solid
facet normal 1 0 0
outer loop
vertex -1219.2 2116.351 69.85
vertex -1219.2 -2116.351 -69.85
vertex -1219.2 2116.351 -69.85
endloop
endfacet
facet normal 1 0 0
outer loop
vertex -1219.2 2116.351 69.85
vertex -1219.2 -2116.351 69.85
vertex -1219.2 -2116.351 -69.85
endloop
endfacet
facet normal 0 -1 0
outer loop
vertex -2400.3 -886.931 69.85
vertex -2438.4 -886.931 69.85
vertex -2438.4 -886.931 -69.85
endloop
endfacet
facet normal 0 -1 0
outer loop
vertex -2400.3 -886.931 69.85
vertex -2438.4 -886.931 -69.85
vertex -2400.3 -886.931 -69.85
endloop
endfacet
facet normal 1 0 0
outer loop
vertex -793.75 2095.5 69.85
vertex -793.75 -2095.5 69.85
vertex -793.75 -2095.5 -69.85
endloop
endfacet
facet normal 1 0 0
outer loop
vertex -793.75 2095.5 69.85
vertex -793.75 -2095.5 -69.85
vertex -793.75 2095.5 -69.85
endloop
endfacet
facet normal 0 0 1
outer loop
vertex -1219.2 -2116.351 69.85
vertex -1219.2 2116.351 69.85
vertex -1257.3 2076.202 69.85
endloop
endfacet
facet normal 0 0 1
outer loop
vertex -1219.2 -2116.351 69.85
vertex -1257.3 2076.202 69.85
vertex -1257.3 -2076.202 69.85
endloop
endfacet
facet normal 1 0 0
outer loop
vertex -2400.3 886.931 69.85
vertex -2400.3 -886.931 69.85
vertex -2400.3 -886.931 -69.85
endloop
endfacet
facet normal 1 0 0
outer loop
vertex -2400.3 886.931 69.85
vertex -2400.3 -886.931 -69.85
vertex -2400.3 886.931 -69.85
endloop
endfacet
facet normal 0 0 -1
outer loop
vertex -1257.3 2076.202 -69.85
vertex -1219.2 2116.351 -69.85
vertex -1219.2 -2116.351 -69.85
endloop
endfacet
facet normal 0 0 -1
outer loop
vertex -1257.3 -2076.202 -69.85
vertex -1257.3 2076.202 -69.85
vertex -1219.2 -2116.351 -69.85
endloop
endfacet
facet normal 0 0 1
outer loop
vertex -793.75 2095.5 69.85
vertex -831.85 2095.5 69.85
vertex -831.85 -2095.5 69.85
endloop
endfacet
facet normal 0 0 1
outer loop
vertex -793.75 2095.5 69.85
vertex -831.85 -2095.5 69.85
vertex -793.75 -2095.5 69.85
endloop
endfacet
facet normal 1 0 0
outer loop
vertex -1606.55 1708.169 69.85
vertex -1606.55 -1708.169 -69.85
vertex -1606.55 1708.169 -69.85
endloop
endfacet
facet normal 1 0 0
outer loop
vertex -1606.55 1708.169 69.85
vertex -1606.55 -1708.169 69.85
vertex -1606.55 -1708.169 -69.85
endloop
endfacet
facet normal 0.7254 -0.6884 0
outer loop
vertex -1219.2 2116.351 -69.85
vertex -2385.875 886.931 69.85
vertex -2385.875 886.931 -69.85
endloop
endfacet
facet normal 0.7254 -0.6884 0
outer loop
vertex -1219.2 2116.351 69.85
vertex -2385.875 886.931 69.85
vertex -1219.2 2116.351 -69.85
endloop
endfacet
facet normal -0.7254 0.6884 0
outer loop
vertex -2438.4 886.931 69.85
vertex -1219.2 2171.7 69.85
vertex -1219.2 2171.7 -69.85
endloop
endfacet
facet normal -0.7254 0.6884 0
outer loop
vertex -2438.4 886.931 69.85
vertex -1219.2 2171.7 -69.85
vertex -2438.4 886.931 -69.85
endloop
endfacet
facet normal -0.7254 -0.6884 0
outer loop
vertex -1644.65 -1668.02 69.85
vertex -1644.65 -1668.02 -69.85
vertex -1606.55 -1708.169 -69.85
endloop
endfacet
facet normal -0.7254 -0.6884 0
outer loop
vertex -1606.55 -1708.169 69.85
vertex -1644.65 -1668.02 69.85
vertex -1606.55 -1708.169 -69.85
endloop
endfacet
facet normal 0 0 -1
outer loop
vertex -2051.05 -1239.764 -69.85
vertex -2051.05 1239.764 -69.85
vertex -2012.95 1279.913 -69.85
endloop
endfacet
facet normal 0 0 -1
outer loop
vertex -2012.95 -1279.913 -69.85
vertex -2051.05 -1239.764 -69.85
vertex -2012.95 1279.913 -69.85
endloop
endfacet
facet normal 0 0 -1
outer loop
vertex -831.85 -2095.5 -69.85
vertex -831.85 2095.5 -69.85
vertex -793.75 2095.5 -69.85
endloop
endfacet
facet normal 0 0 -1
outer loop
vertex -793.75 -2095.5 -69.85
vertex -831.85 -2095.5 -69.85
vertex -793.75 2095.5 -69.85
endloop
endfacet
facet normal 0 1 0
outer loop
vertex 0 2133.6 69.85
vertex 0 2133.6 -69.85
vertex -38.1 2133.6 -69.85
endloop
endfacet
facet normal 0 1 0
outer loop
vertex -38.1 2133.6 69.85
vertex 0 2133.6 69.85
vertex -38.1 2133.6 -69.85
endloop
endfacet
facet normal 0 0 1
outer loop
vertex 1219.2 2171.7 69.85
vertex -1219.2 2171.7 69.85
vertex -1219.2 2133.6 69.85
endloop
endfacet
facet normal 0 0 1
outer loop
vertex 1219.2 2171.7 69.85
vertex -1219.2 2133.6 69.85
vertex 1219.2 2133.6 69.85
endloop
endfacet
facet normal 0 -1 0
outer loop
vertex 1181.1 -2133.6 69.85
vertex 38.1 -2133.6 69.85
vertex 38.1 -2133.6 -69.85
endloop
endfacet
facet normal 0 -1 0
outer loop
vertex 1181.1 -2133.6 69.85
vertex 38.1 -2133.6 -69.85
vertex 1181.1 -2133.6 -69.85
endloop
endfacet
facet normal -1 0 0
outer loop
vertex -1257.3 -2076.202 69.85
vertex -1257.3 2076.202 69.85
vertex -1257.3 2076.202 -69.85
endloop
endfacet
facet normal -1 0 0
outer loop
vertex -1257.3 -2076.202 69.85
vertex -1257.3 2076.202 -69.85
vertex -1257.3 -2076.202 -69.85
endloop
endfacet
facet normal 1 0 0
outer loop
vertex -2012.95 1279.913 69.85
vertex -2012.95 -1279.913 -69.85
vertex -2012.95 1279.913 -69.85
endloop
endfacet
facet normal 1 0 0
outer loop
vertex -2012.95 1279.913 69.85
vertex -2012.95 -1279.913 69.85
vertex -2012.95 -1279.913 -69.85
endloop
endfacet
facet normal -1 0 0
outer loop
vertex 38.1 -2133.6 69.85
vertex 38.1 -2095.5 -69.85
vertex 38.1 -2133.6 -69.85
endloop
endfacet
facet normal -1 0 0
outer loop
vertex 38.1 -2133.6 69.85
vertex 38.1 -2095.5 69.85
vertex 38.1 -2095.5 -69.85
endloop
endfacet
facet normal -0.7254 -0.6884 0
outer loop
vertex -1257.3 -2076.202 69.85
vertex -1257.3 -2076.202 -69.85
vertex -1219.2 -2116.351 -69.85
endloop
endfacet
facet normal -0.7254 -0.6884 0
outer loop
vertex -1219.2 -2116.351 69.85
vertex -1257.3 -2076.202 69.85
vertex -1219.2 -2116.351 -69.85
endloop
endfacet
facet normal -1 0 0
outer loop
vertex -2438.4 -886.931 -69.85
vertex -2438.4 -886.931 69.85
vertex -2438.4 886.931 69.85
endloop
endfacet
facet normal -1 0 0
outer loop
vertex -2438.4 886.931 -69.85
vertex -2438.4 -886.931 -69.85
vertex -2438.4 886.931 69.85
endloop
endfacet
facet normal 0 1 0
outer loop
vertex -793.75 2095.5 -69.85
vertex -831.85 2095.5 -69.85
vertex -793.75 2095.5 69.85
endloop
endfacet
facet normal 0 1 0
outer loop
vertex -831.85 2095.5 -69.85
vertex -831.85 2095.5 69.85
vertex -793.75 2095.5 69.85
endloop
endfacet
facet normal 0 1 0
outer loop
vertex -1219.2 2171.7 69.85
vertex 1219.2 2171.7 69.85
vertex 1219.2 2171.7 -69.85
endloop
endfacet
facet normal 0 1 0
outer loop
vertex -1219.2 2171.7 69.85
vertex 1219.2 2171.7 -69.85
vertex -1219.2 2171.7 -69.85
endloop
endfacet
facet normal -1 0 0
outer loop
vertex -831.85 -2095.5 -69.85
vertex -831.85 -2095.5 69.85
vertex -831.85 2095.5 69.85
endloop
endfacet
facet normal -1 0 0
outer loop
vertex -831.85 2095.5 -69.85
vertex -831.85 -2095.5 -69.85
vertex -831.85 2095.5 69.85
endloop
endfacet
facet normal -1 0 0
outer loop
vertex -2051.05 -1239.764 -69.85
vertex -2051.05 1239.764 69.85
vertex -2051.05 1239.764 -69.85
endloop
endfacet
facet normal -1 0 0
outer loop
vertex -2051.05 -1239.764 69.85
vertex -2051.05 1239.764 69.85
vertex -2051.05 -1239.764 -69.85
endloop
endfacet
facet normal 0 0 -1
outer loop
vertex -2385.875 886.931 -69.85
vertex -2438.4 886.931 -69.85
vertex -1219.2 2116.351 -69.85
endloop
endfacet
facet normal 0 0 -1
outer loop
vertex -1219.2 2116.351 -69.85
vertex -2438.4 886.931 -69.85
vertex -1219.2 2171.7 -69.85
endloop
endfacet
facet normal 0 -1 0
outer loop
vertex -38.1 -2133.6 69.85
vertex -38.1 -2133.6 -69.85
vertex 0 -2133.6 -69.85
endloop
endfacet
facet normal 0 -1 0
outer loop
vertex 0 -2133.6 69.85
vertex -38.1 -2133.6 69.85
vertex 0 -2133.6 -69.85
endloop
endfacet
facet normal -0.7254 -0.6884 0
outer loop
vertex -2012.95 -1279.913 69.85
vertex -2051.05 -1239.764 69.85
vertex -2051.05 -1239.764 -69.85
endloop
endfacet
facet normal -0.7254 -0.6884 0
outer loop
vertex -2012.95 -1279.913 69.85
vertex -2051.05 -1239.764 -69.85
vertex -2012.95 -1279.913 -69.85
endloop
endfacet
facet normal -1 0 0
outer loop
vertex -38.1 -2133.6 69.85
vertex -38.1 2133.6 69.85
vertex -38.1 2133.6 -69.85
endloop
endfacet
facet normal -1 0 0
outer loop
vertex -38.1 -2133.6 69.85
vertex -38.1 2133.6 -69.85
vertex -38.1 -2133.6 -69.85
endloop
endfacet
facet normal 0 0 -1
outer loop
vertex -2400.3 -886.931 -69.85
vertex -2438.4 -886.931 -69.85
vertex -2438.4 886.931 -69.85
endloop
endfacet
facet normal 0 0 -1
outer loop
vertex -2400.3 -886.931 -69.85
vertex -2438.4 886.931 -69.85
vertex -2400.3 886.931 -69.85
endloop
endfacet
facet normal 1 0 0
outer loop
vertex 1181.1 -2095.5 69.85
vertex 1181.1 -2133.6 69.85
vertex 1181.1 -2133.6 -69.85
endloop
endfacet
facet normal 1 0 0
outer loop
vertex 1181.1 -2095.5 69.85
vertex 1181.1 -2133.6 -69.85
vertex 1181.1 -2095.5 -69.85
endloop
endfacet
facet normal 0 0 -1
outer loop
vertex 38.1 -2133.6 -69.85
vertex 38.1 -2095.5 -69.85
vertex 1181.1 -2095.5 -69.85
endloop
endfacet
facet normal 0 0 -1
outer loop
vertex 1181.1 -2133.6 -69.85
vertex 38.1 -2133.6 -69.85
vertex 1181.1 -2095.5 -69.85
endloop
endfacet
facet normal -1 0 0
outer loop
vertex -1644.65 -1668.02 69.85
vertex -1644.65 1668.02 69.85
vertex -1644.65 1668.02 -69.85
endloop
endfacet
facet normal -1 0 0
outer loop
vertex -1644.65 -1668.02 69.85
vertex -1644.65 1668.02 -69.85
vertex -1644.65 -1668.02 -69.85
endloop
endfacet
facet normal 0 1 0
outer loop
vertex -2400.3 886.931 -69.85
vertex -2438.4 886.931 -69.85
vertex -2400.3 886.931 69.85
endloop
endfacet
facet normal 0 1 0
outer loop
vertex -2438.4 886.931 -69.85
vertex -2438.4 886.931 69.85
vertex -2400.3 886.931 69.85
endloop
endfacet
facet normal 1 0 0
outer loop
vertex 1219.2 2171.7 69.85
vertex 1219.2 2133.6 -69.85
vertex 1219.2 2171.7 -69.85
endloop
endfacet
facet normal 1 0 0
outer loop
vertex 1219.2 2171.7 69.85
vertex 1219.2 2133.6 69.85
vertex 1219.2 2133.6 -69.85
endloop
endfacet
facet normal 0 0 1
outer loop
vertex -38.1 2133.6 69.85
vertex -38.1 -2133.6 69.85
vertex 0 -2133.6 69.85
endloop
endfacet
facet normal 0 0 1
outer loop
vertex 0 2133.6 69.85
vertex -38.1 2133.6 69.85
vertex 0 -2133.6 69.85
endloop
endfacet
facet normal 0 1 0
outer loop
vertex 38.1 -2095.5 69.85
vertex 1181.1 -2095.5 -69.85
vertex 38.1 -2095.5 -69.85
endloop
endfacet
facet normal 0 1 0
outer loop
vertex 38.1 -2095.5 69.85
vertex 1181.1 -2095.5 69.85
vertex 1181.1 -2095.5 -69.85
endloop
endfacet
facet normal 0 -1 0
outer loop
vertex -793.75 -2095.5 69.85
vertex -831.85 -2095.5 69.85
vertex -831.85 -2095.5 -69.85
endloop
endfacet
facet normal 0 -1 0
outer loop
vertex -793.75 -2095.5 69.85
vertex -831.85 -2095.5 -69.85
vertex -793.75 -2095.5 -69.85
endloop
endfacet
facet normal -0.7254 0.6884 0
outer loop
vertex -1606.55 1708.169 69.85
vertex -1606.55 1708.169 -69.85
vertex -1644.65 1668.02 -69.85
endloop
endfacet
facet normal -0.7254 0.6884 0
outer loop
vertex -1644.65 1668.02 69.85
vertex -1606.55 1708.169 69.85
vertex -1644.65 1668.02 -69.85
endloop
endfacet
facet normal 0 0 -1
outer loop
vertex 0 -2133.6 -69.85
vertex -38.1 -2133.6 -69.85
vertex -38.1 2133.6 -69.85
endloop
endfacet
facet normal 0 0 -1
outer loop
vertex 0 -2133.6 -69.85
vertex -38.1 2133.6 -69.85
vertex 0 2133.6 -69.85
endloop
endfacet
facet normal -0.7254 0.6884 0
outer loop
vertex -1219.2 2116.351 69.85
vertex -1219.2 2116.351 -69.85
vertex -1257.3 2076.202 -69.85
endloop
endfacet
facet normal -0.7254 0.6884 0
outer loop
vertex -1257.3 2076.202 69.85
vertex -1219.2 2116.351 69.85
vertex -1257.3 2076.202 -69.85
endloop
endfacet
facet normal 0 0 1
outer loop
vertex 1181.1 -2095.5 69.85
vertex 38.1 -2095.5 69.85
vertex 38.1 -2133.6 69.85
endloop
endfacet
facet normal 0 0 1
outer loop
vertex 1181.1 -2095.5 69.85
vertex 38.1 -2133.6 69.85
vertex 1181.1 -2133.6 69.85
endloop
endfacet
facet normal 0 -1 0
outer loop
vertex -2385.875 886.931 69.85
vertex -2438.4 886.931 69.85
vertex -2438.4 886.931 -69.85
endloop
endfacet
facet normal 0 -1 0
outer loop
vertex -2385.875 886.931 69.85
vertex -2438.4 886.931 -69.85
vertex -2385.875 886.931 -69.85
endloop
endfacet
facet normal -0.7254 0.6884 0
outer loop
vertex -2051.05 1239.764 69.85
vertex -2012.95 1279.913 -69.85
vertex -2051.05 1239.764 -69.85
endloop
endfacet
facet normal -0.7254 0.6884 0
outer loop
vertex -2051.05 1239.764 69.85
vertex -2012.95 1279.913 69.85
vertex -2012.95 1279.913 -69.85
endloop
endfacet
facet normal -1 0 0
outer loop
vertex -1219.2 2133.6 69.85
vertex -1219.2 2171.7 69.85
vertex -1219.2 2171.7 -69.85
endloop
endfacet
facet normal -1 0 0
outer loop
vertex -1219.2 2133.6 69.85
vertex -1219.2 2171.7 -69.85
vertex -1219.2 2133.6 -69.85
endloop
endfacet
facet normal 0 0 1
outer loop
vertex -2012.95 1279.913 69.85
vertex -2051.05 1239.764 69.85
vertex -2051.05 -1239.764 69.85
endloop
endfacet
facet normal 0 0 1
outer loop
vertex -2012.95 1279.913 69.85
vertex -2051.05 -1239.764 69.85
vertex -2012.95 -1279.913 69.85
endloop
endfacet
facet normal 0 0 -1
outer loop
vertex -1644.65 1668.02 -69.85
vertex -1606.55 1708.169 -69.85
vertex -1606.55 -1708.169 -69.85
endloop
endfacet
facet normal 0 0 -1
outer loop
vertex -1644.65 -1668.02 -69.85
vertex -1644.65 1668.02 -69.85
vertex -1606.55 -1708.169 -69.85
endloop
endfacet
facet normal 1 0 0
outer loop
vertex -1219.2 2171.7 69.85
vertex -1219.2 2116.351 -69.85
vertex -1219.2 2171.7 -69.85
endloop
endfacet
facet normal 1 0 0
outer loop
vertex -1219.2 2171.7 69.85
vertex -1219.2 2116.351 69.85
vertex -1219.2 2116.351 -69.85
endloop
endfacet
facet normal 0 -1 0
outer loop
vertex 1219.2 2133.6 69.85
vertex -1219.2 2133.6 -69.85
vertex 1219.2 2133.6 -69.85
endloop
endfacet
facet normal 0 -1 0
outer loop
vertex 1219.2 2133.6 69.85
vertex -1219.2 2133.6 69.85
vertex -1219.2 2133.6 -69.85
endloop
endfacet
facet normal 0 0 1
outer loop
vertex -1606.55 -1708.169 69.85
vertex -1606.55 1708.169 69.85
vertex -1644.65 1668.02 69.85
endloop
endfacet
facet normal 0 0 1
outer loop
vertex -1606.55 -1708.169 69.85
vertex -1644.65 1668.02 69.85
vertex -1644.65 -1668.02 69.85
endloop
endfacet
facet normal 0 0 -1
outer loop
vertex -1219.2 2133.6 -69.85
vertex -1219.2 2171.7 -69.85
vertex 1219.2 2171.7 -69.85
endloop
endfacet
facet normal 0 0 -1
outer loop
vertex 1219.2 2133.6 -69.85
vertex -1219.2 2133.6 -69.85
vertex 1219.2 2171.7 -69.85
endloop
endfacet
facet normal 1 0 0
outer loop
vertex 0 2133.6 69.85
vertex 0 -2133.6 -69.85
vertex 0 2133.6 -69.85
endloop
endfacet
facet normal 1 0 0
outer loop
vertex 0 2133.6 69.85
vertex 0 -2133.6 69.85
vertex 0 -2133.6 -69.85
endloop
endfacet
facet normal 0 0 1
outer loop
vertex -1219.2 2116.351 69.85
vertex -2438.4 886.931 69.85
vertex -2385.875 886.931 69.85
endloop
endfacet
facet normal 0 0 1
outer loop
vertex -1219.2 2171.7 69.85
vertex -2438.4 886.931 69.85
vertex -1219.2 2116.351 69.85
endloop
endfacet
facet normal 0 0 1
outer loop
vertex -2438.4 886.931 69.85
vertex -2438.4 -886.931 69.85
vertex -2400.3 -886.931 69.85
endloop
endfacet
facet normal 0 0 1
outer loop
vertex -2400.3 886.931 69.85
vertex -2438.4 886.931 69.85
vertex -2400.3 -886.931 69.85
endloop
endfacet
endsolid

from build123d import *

# Parameters (mm, degrees)
F1_DEPTH = 69.85
F0_W     = 38.1
F0_H     = 4191
F0_H_2   = 1773.8625425149
F2_DEPTH = 69.85
F3_DEPTH = 69.85


with BuildPart() as f1:
    # F0 (on Top) → F1 (new body, symmetric)
    with BuildSketch(Plane.XY):
        Polygon((0, 0), (0, 2133.6), (-38.1, 2133.6), (-38.1, 2095.5), (-38.1, -2095.5), (-38.1, -2133.6), (0, -2133.6), align=None)
    extrude(amount=F1_DEPTH, both=True)


with BuildPart() as f1b:
    # F0 (on Top) → F1, piece 2 (new body, symmetric)
    with BuildSketch(Plane.XY):
        Polygon((387.35, -2095.5), (38.1, -2095.5), (38.1, -2133.6), (1181.1, -2133.6), (1181.1, -2095.5), (831.85, -2095.5), (793.75, -2095.5), (425.45, -2095.5), align=None)
    extrude(amount=F1_DEPTH, both=True)


with BuildPart() as f1c:
    # F0 (on Top) → F1, piece 3 (new body, symmetric)
    with BuildSketch(Plane.XY):
        Polygon((-1219.2, -2116.3506185252), (-1219.2, 2116.3506185252), (-1257.3, 2076.201595752), (-1257.3, -2076.201595752), align=None)
    extrude(amount=F1_DEPTH, both=True)


with BuildPart() as f1d:
    # F0 (on Top) → F1, piece 4 (new body, symmetric)
    with BuildSketch(Plane.XY):
        with Locations((-812.8, 0)):
            Rectangle(F0_W, F0_H)
    extrude(amount=F1_DEPTH, both=True)


with BuildPart() as f1e:
    # F0 (on Top) → F1, piece 5 (new body, symmetric)
    with BuildSketch(Plane.XY):
        with Locations((-2419.35, 0)):
            Rectangle(F0_W, F0_H_2)
    extrude(amount=F1_DEPTH, both=True)


with BuildPart() as f1f:
    # F0 (on Top) → F1, piece 6 (new body, symmetric)
    with BuildSketch(Plane.XY):
        Polygon((-1606.55, -1708.1688869976), (-1606.55, 1708.1688869976), (-1644.65, 1668.0198642244), (-1644.65, -1668.0198642244), align=None)
    extrude(amount=F1_DEPTH, both=True)


with BuildPart() as f1g:
    # F0 (on Top) → F1, piece 7 (new body, symmetric)
    with BuildSketch(Plane.XY):
        Polygon((-2012.95, 1279.9126440834), (-2051.05, 1239.7636213102), (-2051.05, -1239.7636213102), (-2012.95, -1279.9126440834), align=None)
    extrude(amount=F1_DEPTH, both=True)


with BuildPart() as f2:
    # F0 (on Top) → F2 (new body, symmetric)
    with BuildSketch(Plane.XY):
        Polygon((0, 2133.6), (38.1, 2133.6), (1181.1, 2133.6), (1219.2, 2133.6), (1219.2, 2171.7), (-1219.2, 2171.7), (-1219.2, 2133.6), (-1181.1, 2133.6), (-38.1, 2133.6), align=None)
    extrude(amount=F2_DEPTH, both=True)


with BuildPart() as f3:
    # F0 (on Top) → F3 (new body, symmetric)
    with BuildSketch(Plane.XY):
        Polygon((-1219.2, 2116.3506185252), (-1219.2, 2133.6), (-1219.2, 2171.7), (-2438.4, 886.9312712575), (-2400.3, 886.9312712575), (-2385.8753981908, 886.9312712575), (-2051.05, 1239.7636213102), (-2012.95, 1279.9126440834), (-1644.65, 1668.0198642244), (-1606.55, 1708.1688869976), (-1257.3, 2076.201595752), align=None)
    extrude(amount=F3_DEPTH, both=True)


solid = Compound([f1.part, f1b.part, f1c.part, f1d.part, f1e.part, f1f.part, f1g.part, f2.part, f3.part])
